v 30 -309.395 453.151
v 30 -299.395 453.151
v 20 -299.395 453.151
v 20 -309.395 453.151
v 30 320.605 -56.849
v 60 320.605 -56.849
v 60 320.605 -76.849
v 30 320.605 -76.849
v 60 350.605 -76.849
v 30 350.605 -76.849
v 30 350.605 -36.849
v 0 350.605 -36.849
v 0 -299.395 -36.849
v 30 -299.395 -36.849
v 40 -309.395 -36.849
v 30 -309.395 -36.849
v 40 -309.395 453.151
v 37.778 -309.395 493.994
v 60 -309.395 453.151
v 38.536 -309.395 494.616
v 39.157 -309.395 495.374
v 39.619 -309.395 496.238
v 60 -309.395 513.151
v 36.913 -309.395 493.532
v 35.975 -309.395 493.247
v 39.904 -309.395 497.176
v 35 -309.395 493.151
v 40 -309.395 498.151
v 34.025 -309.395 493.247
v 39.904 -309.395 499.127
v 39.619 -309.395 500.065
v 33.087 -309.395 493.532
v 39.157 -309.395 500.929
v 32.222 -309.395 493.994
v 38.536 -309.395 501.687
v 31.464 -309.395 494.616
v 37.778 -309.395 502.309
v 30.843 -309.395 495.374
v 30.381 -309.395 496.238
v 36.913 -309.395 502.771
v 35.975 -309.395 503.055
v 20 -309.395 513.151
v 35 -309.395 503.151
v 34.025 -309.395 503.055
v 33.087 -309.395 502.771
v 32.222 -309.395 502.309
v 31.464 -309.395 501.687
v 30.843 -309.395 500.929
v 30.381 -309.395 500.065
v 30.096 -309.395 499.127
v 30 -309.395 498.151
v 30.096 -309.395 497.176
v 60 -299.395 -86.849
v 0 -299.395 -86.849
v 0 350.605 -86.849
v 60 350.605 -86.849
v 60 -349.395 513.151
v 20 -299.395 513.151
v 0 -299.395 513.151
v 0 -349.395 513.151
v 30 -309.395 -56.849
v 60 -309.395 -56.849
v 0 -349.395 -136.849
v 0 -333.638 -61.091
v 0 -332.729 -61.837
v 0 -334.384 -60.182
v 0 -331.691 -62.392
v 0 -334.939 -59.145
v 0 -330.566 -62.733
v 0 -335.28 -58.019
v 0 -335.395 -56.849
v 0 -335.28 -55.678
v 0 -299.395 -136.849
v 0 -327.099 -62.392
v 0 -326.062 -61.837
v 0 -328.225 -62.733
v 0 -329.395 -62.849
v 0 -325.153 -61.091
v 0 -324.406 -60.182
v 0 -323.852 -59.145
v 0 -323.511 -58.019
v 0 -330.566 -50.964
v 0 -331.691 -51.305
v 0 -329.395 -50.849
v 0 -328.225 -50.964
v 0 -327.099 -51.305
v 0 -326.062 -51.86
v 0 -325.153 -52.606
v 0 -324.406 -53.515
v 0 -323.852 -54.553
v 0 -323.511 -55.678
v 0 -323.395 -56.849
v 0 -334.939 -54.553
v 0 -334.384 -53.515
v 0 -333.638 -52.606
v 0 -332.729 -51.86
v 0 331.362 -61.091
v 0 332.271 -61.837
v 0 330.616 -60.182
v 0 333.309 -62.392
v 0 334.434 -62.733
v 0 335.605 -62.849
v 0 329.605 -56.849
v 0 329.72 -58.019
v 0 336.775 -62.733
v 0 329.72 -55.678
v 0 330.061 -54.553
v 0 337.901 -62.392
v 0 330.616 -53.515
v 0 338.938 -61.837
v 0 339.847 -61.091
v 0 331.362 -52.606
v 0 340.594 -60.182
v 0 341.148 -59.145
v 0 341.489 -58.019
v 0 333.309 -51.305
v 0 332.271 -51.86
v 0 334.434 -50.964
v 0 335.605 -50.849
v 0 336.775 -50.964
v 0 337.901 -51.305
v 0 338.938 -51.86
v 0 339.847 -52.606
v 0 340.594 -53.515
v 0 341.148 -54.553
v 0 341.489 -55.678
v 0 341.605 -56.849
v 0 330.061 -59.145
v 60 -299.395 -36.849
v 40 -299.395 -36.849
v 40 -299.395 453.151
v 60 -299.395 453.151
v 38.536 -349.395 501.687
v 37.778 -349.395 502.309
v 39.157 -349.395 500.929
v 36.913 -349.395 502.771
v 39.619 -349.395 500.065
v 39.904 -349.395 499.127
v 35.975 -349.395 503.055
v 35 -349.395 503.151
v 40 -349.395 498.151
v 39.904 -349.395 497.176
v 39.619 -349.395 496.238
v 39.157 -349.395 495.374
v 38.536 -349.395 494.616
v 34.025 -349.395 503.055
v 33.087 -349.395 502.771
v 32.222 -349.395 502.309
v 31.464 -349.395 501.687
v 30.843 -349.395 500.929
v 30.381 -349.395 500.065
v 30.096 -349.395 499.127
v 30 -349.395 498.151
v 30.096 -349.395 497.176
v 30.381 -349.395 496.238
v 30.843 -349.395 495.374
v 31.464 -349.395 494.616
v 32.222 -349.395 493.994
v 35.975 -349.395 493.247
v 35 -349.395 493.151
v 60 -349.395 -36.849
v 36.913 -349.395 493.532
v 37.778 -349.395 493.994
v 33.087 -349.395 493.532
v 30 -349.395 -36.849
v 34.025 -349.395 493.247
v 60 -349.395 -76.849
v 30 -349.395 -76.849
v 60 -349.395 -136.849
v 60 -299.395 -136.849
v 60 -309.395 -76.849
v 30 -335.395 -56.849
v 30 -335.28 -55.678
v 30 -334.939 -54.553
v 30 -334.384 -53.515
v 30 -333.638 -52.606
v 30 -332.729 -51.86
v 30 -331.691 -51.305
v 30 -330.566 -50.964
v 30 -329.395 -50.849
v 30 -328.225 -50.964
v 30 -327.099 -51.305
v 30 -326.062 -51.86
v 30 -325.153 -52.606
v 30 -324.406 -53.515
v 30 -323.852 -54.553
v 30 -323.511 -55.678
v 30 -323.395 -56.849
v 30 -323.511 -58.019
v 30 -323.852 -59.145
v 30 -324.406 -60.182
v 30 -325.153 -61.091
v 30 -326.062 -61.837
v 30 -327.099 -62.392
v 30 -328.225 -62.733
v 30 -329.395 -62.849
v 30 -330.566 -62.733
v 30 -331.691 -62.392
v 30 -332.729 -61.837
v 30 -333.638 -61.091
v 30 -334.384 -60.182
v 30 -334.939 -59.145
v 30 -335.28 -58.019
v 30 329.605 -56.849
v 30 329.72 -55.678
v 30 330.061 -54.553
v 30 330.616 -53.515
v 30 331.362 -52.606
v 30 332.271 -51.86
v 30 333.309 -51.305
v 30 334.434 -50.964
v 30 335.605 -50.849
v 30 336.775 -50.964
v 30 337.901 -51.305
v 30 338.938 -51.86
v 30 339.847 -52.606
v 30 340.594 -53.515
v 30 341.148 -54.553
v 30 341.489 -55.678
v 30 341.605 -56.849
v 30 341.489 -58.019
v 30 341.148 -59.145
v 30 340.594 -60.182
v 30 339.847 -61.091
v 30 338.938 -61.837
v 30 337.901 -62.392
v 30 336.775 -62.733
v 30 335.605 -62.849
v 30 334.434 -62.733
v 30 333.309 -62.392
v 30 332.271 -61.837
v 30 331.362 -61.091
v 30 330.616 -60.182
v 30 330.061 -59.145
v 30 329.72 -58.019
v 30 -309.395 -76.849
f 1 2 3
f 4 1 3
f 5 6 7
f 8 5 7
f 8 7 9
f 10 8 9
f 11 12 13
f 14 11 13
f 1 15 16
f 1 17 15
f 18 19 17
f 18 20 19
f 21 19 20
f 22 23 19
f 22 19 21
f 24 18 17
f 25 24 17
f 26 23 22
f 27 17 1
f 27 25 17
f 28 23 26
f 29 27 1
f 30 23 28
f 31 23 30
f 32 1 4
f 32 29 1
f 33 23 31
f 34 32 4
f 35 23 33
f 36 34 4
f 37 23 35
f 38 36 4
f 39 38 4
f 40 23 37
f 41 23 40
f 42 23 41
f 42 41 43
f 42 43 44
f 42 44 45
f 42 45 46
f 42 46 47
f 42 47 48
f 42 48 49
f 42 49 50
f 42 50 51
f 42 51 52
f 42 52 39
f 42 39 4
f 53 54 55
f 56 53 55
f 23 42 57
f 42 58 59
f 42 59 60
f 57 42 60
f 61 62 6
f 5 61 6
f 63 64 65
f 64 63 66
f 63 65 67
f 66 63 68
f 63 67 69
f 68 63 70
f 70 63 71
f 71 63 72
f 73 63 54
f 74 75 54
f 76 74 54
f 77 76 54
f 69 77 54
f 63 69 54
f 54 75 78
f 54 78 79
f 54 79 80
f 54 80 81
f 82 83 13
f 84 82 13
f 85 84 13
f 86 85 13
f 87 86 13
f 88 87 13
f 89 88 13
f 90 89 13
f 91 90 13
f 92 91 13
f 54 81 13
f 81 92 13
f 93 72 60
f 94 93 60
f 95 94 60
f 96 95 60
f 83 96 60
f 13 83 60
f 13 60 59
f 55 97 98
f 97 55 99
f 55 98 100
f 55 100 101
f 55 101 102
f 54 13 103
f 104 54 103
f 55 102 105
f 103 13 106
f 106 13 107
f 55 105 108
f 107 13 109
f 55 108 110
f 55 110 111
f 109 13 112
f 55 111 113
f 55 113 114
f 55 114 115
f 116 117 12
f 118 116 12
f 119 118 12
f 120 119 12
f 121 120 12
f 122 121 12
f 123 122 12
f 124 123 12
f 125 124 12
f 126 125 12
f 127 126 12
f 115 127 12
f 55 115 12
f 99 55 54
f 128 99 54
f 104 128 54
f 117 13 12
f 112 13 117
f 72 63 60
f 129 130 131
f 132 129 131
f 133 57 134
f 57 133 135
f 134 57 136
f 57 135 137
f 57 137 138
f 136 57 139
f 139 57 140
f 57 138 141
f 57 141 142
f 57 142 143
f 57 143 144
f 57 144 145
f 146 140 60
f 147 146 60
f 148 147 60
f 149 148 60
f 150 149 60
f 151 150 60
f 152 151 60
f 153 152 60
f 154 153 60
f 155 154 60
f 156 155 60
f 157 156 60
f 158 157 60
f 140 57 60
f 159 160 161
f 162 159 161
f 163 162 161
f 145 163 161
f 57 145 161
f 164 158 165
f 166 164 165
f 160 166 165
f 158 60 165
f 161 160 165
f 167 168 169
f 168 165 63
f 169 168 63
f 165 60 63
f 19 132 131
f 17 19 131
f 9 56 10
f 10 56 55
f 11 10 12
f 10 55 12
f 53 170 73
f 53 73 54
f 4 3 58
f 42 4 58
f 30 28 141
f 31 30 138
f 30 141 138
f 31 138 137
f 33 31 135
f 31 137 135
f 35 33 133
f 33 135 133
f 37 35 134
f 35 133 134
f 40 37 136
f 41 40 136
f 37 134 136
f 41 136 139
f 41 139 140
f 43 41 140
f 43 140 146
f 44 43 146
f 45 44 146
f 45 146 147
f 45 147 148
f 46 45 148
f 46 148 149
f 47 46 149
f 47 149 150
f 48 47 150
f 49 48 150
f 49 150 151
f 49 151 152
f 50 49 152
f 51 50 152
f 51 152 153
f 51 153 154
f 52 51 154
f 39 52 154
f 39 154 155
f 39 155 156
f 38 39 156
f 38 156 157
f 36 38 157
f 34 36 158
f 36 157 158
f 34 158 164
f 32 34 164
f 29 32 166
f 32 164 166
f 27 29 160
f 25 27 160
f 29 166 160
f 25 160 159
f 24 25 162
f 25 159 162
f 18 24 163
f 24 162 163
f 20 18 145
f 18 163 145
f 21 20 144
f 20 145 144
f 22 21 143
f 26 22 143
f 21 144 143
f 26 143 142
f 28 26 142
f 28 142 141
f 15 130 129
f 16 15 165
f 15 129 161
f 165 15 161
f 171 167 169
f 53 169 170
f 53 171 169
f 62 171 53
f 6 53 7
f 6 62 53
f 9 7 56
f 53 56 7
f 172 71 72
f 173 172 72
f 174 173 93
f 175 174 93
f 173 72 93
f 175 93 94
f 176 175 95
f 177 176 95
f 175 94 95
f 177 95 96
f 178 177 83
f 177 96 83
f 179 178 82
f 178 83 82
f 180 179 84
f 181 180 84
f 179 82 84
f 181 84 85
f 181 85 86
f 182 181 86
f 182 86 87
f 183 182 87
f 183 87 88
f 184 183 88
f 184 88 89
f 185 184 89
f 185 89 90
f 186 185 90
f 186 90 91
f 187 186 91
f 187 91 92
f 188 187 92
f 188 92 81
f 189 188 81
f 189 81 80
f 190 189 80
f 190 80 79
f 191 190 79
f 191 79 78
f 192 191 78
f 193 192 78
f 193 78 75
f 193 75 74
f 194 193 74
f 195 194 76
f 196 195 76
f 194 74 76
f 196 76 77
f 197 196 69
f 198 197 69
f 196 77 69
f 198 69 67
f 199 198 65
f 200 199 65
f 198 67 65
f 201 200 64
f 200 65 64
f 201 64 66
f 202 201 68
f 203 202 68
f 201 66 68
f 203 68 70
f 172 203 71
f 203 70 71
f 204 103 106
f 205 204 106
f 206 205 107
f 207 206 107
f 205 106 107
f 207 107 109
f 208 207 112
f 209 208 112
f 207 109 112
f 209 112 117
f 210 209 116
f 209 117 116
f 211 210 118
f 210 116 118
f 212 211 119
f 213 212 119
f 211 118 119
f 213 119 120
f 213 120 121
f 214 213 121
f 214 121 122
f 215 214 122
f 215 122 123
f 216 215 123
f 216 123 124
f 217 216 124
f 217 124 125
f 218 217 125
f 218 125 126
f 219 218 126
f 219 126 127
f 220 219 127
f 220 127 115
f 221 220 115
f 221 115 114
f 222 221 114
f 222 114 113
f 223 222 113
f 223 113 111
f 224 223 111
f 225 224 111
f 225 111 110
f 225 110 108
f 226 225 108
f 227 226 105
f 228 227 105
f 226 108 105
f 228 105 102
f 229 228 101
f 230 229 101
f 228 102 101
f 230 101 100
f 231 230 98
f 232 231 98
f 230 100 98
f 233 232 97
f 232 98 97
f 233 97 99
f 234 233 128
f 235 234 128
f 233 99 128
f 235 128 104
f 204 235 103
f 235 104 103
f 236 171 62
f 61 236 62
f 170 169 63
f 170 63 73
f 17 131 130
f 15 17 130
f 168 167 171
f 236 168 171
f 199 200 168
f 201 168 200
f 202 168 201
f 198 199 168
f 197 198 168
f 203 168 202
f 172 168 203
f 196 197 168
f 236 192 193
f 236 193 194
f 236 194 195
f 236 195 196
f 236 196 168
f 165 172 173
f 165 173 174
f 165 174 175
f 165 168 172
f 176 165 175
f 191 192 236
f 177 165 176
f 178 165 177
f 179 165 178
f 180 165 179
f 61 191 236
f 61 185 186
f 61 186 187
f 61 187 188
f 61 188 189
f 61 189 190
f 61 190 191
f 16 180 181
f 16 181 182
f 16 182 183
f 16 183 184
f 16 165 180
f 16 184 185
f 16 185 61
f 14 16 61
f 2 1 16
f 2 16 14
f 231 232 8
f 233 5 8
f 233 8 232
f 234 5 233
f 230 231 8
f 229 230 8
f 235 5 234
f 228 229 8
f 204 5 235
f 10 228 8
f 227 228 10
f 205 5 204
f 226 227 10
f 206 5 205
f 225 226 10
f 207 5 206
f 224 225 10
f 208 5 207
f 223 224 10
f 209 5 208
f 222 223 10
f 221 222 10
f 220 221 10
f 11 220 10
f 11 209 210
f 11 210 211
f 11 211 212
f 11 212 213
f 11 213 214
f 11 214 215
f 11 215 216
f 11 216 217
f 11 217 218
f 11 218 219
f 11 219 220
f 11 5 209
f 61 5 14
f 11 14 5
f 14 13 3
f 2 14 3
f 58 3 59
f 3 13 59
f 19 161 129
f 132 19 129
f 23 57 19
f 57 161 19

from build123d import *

# Parameters (mm, degrees)
F1_DEPTH = 60
F3_DEPTH = 30
F5_D     = 12
F7_DEPTH = 10
F9_D     = 10


with BuildPart() as f1:
    # F0 (on Right) → F1 (new body)
    with BuildSketch(Plane.YZ):
        Polygon((-299.395279, -136.848614), (-299.395279, -86.848614), (350.604721, -86.848614), (350.604721, -36.848614), (-299.395279, -36.848614), (-299.395279, 513.151386), (-349.395279, 513.151386), (-349.395279, -36.848614), (-349.395279, -86.848614), (-349.395279, -136.848614), align=None)
    extrude(amount=F1_DEPTH)

    # F2 (on face) → F3 (cut)
    with BuildSketch(Plane.YZ.offset(60)):
        Polygon((-309.395279, -36.848614), (-349.395279, -36.848614), (-349.395279, -76.848614), (-309.395279, -76.848614), (-309.395279, -56.848614), (320.604721, -56.848614), (320.604721, -76.848614), (350.604721, -76.848614), (350.604721, -36.848614), align=None)
    extrude(amount=-F3_DEPTH, mode=Mode.SUBTRACT)

    # F5 (through all)
    with Locations(Plane.YZ.offset(30)):
        with Locations((-329.395279, -56.848614), (335.604721, -56.848614)):
            Hole(F5_D / 2)

    # F6 (on face) → F7 (cut)
    with BuildSketch(Plane(origin=(0, -299.395279, 0), x_dir=(-1, 0, 0), z_dir=(0, 1, 0))):
        Polygon((-40, -36.848614), (-30, -36.848614), (-30, 453.151386), (-20, 453.151386), (-20, 513.151386), (-60, 513.151386), (-60, 463.151386), (-60, 453.151386), (-40, 453.151386), align=None)
    extrude(amount=-F7_DEPTH, mode=Mode.SUBTRACT)

    # F9 (through all)
    with Locations(Plane(origin=(0, -309.395279, 0), x_dir=(-1, 0, 0), z_dir=(0, 1, 0))):
        with Locations((-35, 498.151386)):
            Hole(F9_D / 2)


solid = f1.part
